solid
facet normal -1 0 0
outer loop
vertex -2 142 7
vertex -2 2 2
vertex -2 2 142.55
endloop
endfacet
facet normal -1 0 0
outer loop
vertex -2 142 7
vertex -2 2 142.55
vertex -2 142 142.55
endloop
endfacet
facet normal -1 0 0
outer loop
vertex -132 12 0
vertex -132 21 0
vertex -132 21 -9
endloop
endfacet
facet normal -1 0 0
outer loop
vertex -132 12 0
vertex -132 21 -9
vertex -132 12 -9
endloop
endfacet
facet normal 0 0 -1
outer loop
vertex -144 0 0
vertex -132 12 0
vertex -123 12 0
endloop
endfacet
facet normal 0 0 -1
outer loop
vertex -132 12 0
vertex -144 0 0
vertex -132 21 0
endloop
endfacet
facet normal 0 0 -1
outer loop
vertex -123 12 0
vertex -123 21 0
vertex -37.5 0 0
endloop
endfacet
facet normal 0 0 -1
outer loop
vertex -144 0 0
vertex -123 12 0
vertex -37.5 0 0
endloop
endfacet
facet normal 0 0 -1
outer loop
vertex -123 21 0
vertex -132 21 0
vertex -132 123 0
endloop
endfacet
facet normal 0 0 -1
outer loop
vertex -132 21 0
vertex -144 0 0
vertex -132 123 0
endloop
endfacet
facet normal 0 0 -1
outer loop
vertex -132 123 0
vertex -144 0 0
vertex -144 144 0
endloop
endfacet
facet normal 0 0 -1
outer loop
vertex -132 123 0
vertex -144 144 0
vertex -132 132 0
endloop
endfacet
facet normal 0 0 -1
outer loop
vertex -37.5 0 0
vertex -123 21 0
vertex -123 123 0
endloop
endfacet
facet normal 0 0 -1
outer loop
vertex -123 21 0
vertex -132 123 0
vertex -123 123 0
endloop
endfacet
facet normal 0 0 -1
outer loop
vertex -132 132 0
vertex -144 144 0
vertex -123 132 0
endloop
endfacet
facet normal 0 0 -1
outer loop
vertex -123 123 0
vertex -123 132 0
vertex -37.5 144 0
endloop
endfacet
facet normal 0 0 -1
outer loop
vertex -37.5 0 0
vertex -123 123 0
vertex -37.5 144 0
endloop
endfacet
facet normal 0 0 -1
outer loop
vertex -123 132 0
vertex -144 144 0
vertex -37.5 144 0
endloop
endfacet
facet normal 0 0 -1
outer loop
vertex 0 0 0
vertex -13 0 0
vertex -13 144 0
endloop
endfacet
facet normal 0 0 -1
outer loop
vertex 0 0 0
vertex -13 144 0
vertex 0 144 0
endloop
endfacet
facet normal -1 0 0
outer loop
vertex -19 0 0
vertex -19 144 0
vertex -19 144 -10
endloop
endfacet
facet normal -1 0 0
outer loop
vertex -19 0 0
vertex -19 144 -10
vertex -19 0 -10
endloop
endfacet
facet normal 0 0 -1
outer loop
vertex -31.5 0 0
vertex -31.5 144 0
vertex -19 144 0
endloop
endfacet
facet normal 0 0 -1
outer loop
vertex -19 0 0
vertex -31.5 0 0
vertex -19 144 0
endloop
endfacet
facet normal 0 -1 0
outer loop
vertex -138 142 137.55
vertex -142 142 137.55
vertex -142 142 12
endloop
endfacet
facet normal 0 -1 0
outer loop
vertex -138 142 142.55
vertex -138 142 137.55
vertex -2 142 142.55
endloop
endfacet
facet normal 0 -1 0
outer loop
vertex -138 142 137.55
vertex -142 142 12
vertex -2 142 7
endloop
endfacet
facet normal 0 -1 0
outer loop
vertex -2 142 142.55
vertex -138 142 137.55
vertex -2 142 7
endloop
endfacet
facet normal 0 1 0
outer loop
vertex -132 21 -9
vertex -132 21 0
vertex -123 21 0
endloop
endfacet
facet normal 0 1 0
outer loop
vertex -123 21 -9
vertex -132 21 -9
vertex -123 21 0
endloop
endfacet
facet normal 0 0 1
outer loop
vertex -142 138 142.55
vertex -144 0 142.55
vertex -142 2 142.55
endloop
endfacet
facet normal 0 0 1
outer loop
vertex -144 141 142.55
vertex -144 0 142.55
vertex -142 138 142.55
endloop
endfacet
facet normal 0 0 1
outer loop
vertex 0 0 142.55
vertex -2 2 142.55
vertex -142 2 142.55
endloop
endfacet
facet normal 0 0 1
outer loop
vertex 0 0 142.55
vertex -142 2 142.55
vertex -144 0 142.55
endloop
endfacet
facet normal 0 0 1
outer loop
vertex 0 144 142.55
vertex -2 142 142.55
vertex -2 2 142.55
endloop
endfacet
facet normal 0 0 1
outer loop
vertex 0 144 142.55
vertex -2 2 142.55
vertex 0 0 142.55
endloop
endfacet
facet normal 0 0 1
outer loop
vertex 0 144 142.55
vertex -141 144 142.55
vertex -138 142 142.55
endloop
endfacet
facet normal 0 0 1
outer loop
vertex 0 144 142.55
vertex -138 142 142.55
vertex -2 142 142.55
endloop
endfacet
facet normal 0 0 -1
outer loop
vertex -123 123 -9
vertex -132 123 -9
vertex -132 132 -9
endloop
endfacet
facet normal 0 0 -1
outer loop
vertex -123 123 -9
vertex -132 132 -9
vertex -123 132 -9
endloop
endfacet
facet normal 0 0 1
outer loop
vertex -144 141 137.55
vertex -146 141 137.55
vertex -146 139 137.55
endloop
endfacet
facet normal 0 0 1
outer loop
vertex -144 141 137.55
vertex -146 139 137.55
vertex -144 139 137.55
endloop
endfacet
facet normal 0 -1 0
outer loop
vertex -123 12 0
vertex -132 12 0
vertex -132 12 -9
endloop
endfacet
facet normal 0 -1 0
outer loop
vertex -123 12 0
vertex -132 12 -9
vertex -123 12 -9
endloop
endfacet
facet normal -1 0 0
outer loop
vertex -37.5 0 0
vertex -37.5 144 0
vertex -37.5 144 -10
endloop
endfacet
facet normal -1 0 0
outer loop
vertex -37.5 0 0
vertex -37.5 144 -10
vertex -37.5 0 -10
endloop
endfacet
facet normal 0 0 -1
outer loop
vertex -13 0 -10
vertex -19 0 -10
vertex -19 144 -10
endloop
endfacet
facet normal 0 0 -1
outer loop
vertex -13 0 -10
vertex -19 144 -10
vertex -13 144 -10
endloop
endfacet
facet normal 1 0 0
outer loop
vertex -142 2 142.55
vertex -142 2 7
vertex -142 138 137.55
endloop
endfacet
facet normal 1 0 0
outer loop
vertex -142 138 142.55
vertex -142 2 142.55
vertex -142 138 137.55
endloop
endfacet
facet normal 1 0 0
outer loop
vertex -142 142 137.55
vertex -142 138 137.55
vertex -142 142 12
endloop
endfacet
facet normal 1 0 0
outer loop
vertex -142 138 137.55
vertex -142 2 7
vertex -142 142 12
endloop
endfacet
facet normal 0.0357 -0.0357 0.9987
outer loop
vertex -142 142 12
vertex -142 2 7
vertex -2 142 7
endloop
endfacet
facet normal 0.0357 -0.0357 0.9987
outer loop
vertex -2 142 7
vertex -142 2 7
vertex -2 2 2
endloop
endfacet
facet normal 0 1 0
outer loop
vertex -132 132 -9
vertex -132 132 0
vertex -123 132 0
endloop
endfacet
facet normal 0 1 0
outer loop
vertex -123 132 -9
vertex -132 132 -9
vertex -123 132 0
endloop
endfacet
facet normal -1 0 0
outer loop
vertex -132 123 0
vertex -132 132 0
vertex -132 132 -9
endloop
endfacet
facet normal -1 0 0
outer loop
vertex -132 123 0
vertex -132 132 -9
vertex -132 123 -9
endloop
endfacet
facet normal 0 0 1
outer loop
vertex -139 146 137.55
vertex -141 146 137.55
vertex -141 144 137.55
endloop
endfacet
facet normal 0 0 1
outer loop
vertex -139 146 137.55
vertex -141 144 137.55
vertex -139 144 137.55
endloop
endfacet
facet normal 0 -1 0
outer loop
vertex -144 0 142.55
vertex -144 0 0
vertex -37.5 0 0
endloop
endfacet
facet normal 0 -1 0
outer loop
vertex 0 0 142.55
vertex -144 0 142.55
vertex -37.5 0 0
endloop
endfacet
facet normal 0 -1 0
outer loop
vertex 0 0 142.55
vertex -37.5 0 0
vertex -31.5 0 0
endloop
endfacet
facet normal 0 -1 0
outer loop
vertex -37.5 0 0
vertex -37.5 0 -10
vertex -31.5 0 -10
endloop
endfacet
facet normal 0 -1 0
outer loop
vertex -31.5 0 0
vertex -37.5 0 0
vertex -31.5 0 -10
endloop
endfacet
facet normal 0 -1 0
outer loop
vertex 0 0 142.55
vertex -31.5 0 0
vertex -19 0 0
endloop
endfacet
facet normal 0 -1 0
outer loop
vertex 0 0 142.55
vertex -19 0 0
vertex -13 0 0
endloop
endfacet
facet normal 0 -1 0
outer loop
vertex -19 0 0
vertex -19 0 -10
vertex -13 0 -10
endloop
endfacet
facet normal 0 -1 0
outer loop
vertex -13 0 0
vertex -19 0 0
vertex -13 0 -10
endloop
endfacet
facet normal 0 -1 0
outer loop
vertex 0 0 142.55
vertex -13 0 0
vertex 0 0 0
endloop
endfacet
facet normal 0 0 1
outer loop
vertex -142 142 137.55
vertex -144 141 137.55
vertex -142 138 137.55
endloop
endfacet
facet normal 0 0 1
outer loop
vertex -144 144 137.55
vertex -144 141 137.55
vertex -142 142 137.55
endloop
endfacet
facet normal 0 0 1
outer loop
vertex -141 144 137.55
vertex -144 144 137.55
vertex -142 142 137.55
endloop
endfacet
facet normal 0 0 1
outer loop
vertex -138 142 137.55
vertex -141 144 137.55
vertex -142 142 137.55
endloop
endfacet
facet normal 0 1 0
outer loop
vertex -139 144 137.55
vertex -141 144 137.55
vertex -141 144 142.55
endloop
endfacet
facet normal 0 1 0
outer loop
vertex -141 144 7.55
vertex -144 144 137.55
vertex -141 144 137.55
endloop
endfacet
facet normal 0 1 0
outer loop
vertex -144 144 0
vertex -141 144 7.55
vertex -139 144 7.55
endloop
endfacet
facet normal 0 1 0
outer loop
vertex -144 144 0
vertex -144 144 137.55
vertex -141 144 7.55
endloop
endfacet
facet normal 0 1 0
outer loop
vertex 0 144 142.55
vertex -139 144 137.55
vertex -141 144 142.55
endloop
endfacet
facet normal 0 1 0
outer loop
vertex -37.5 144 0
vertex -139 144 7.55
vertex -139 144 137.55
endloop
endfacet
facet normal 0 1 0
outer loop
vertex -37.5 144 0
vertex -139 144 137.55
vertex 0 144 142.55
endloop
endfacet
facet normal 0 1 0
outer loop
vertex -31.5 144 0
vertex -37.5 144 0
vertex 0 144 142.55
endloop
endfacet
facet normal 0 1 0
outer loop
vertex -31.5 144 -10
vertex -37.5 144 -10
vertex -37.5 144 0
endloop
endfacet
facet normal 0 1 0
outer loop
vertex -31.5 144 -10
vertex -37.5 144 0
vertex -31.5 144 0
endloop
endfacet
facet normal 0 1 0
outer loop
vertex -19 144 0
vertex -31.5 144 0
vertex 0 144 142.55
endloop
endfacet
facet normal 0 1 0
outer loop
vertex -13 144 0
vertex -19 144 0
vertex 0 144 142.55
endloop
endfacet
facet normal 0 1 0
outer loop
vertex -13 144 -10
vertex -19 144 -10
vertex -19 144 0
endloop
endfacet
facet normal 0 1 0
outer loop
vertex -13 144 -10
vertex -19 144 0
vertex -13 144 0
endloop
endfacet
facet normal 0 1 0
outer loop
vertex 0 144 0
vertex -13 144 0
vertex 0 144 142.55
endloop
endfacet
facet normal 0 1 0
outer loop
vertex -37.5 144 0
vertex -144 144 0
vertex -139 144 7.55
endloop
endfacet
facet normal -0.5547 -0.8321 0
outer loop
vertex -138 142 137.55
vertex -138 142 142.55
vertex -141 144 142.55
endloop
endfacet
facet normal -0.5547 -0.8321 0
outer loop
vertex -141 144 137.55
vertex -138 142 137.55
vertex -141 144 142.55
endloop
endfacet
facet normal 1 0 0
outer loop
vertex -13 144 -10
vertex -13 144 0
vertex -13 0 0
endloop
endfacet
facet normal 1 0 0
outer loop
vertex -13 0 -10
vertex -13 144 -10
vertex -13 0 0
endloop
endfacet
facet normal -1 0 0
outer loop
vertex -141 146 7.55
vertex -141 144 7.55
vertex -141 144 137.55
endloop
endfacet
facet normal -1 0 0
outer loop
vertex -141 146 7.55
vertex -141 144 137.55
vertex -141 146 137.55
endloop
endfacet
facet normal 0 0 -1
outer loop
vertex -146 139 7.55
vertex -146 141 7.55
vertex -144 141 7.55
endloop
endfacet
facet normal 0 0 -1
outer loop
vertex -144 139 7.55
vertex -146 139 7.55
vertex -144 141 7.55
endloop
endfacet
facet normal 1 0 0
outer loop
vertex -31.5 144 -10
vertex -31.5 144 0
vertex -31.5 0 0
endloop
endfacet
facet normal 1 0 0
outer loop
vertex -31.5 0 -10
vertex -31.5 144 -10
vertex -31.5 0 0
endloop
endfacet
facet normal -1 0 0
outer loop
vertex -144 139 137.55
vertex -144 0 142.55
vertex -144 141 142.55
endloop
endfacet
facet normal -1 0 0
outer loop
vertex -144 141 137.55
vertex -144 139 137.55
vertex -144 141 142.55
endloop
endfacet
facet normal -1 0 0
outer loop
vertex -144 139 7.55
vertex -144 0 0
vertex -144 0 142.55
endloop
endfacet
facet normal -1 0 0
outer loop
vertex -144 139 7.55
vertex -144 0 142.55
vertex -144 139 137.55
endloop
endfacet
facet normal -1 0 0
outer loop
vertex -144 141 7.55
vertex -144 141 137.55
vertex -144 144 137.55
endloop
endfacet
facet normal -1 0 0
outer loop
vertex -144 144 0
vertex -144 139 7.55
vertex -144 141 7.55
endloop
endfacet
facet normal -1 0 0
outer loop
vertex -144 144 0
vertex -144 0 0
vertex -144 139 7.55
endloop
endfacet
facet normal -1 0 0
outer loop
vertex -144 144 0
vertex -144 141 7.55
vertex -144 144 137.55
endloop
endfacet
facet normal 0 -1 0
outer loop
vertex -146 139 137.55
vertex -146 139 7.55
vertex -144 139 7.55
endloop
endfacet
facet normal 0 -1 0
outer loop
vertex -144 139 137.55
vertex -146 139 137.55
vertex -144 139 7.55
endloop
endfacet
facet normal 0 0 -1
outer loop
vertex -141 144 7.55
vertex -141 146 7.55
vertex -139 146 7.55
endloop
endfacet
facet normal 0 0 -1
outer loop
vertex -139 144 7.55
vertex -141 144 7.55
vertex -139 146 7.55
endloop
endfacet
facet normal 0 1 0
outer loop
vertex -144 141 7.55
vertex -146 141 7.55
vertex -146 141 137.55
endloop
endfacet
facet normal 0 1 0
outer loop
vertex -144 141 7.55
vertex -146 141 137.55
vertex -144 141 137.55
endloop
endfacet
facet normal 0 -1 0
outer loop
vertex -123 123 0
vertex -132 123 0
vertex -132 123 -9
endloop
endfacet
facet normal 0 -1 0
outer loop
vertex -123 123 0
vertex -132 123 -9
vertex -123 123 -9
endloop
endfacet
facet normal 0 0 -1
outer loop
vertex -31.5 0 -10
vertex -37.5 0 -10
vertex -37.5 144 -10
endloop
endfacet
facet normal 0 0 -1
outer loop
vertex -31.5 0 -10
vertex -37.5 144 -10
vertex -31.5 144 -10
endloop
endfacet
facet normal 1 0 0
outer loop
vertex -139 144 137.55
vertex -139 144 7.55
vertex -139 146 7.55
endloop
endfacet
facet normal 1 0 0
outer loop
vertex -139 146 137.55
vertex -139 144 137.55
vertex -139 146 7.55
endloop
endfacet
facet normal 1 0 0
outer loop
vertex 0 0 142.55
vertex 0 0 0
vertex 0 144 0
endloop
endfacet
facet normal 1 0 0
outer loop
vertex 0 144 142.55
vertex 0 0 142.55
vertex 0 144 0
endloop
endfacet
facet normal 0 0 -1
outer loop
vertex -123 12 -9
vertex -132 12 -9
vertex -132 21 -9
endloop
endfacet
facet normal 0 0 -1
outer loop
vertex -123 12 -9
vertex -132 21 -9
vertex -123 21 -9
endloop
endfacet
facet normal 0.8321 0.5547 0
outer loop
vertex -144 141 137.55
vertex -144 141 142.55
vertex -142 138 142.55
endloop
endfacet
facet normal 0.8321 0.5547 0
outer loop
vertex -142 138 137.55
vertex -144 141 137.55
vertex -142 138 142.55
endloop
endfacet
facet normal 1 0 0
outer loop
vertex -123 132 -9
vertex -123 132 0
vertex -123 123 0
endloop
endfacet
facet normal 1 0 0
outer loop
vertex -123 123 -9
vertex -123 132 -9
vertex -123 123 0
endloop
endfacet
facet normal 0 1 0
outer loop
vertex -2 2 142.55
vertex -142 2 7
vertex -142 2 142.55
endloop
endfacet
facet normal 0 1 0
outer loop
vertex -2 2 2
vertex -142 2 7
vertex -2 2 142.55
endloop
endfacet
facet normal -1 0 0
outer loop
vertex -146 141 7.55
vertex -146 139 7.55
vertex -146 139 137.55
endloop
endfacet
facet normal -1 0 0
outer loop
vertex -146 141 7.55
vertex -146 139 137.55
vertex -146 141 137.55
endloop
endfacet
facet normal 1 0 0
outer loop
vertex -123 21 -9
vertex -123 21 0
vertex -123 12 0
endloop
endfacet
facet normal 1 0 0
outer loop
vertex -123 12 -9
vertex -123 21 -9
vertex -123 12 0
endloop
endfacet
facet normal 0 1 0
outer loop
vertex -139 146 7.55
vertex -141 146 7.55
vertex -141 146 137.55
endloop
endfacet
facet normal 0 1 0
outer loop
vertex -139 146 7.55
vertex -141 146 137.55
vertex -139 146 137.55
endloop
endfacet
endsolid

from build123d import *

# Parameters (mm, degrees)
F0_W      = 144
F0_H      = 144
F1_DEPTH  = 25
F2_DEPTH  = 142.55
F3_T      = -2
F1_FACE_W = 144
F1_FACE_H = 144
F11_DEPTH = 5
F12_W     = 2
F12_H     = 2
F13_DEPTH = 130
F14_W     = 6
F14_H     = 144
F15_DEPTH = 10
F16_W     = 9
F16_H     = 9
F17_DEPTH = 9


with BuildPart() as f1:
    # F0 (on Top) → F1 (new body)
    with BuildSketch(Plane.XY):
        with Locations((-72, 72)):
            Rectangle(F0_W, F0_H)
    extrude(amount=F1_DEPTH)

    # F0 (on Top) → F2 (join)
    with BuildSketch(Plane.XY):
        with Locations((-72, 72)):
            Rectangle(F0_W, F0_H)
    extrude(amount=F2_DEPTH)

    # F3
    f3_openings = [f1.faces().sort_by_distance(p)[0] for p in [
        (-72, 72, 142.55),
    ]]
    offset(amount=F3_T, openings=f3_openings)

    # F1_face (on face) → F9 section 0
    with BuildSketch(Plane(origin=(-72, 72, 0), x_dir=(1, 0, 0), z_dir=(0, 0, -1))):
        Rectangle(F1_FACE_W, F1_FACE_H)
    # F8 (on 3pt) → F9 section 1
    with BuildSketch(Plane(origin=(0.0661577608, -0.0661577608, 1.8524173028), x_dir=(0.9993636652, 0.0012730747, -0.0356460925), z_dir=(-0.0356688188, 0.0356688188, -0.998726925))):
        Polygon((-2.067473366, -142.1593660309), (-2.067473366, -2.0701087697), (-142.1566169599, -2.2485664223), (-142.1566169599, -142.3378236835), align=None)
    loft()

    # F10 (on face) → F11 (cut)
    with BuildSketch(Plane.XY.offset(142.55)):
        Polygon((-142, 142), (-138, 142), (-141, 144), (-144, 144), (-144, 141), (-142, 138), align=None)
    extrude(amount=-F11_DEPTH, mode=Mode.SUBTRACT)

    # F12 (on face) → F13 (join)
    with BuildSketch(Plane.XY.offset(137.55)):
        with Locations((-140, 145)):
            Rectangle(F12_W, F12_H)
        with Locations((-145, 140)):
            Rectangle(F12_W, F12_H)
    extrude(amount=-F13_DEPTH)

    # F14 (on face) → F15 (join)
    with BuildSketch(Plane(origin=(0, 0, 0), x_dir=(1, 0, 0), z_dir=(0, 0, -1))):
        with Locations((-16, -72)):
            Rectangle(F14_W, F14_H)
        with Locations((-34.5, -72)):
            Rectangle(F14_W, F14_H)
    extrude(amount=F15_DEPTH)

    # F16 (on face) → F17 (join)
    with BuildSketch(Plane(origin=(0, 0, 0), x_dir=(1, 0, 0), z_dir=(0, 0, -1))):
        with Locations((-127.5, -127.5)):
            Rectangle(F16_W, F16_H)
        with Locations((-127.5, -16.5)):
            Rectangle(F16_W, F16_H)
    extrude(amount=F17_DEPTH)


solid = f1.part
